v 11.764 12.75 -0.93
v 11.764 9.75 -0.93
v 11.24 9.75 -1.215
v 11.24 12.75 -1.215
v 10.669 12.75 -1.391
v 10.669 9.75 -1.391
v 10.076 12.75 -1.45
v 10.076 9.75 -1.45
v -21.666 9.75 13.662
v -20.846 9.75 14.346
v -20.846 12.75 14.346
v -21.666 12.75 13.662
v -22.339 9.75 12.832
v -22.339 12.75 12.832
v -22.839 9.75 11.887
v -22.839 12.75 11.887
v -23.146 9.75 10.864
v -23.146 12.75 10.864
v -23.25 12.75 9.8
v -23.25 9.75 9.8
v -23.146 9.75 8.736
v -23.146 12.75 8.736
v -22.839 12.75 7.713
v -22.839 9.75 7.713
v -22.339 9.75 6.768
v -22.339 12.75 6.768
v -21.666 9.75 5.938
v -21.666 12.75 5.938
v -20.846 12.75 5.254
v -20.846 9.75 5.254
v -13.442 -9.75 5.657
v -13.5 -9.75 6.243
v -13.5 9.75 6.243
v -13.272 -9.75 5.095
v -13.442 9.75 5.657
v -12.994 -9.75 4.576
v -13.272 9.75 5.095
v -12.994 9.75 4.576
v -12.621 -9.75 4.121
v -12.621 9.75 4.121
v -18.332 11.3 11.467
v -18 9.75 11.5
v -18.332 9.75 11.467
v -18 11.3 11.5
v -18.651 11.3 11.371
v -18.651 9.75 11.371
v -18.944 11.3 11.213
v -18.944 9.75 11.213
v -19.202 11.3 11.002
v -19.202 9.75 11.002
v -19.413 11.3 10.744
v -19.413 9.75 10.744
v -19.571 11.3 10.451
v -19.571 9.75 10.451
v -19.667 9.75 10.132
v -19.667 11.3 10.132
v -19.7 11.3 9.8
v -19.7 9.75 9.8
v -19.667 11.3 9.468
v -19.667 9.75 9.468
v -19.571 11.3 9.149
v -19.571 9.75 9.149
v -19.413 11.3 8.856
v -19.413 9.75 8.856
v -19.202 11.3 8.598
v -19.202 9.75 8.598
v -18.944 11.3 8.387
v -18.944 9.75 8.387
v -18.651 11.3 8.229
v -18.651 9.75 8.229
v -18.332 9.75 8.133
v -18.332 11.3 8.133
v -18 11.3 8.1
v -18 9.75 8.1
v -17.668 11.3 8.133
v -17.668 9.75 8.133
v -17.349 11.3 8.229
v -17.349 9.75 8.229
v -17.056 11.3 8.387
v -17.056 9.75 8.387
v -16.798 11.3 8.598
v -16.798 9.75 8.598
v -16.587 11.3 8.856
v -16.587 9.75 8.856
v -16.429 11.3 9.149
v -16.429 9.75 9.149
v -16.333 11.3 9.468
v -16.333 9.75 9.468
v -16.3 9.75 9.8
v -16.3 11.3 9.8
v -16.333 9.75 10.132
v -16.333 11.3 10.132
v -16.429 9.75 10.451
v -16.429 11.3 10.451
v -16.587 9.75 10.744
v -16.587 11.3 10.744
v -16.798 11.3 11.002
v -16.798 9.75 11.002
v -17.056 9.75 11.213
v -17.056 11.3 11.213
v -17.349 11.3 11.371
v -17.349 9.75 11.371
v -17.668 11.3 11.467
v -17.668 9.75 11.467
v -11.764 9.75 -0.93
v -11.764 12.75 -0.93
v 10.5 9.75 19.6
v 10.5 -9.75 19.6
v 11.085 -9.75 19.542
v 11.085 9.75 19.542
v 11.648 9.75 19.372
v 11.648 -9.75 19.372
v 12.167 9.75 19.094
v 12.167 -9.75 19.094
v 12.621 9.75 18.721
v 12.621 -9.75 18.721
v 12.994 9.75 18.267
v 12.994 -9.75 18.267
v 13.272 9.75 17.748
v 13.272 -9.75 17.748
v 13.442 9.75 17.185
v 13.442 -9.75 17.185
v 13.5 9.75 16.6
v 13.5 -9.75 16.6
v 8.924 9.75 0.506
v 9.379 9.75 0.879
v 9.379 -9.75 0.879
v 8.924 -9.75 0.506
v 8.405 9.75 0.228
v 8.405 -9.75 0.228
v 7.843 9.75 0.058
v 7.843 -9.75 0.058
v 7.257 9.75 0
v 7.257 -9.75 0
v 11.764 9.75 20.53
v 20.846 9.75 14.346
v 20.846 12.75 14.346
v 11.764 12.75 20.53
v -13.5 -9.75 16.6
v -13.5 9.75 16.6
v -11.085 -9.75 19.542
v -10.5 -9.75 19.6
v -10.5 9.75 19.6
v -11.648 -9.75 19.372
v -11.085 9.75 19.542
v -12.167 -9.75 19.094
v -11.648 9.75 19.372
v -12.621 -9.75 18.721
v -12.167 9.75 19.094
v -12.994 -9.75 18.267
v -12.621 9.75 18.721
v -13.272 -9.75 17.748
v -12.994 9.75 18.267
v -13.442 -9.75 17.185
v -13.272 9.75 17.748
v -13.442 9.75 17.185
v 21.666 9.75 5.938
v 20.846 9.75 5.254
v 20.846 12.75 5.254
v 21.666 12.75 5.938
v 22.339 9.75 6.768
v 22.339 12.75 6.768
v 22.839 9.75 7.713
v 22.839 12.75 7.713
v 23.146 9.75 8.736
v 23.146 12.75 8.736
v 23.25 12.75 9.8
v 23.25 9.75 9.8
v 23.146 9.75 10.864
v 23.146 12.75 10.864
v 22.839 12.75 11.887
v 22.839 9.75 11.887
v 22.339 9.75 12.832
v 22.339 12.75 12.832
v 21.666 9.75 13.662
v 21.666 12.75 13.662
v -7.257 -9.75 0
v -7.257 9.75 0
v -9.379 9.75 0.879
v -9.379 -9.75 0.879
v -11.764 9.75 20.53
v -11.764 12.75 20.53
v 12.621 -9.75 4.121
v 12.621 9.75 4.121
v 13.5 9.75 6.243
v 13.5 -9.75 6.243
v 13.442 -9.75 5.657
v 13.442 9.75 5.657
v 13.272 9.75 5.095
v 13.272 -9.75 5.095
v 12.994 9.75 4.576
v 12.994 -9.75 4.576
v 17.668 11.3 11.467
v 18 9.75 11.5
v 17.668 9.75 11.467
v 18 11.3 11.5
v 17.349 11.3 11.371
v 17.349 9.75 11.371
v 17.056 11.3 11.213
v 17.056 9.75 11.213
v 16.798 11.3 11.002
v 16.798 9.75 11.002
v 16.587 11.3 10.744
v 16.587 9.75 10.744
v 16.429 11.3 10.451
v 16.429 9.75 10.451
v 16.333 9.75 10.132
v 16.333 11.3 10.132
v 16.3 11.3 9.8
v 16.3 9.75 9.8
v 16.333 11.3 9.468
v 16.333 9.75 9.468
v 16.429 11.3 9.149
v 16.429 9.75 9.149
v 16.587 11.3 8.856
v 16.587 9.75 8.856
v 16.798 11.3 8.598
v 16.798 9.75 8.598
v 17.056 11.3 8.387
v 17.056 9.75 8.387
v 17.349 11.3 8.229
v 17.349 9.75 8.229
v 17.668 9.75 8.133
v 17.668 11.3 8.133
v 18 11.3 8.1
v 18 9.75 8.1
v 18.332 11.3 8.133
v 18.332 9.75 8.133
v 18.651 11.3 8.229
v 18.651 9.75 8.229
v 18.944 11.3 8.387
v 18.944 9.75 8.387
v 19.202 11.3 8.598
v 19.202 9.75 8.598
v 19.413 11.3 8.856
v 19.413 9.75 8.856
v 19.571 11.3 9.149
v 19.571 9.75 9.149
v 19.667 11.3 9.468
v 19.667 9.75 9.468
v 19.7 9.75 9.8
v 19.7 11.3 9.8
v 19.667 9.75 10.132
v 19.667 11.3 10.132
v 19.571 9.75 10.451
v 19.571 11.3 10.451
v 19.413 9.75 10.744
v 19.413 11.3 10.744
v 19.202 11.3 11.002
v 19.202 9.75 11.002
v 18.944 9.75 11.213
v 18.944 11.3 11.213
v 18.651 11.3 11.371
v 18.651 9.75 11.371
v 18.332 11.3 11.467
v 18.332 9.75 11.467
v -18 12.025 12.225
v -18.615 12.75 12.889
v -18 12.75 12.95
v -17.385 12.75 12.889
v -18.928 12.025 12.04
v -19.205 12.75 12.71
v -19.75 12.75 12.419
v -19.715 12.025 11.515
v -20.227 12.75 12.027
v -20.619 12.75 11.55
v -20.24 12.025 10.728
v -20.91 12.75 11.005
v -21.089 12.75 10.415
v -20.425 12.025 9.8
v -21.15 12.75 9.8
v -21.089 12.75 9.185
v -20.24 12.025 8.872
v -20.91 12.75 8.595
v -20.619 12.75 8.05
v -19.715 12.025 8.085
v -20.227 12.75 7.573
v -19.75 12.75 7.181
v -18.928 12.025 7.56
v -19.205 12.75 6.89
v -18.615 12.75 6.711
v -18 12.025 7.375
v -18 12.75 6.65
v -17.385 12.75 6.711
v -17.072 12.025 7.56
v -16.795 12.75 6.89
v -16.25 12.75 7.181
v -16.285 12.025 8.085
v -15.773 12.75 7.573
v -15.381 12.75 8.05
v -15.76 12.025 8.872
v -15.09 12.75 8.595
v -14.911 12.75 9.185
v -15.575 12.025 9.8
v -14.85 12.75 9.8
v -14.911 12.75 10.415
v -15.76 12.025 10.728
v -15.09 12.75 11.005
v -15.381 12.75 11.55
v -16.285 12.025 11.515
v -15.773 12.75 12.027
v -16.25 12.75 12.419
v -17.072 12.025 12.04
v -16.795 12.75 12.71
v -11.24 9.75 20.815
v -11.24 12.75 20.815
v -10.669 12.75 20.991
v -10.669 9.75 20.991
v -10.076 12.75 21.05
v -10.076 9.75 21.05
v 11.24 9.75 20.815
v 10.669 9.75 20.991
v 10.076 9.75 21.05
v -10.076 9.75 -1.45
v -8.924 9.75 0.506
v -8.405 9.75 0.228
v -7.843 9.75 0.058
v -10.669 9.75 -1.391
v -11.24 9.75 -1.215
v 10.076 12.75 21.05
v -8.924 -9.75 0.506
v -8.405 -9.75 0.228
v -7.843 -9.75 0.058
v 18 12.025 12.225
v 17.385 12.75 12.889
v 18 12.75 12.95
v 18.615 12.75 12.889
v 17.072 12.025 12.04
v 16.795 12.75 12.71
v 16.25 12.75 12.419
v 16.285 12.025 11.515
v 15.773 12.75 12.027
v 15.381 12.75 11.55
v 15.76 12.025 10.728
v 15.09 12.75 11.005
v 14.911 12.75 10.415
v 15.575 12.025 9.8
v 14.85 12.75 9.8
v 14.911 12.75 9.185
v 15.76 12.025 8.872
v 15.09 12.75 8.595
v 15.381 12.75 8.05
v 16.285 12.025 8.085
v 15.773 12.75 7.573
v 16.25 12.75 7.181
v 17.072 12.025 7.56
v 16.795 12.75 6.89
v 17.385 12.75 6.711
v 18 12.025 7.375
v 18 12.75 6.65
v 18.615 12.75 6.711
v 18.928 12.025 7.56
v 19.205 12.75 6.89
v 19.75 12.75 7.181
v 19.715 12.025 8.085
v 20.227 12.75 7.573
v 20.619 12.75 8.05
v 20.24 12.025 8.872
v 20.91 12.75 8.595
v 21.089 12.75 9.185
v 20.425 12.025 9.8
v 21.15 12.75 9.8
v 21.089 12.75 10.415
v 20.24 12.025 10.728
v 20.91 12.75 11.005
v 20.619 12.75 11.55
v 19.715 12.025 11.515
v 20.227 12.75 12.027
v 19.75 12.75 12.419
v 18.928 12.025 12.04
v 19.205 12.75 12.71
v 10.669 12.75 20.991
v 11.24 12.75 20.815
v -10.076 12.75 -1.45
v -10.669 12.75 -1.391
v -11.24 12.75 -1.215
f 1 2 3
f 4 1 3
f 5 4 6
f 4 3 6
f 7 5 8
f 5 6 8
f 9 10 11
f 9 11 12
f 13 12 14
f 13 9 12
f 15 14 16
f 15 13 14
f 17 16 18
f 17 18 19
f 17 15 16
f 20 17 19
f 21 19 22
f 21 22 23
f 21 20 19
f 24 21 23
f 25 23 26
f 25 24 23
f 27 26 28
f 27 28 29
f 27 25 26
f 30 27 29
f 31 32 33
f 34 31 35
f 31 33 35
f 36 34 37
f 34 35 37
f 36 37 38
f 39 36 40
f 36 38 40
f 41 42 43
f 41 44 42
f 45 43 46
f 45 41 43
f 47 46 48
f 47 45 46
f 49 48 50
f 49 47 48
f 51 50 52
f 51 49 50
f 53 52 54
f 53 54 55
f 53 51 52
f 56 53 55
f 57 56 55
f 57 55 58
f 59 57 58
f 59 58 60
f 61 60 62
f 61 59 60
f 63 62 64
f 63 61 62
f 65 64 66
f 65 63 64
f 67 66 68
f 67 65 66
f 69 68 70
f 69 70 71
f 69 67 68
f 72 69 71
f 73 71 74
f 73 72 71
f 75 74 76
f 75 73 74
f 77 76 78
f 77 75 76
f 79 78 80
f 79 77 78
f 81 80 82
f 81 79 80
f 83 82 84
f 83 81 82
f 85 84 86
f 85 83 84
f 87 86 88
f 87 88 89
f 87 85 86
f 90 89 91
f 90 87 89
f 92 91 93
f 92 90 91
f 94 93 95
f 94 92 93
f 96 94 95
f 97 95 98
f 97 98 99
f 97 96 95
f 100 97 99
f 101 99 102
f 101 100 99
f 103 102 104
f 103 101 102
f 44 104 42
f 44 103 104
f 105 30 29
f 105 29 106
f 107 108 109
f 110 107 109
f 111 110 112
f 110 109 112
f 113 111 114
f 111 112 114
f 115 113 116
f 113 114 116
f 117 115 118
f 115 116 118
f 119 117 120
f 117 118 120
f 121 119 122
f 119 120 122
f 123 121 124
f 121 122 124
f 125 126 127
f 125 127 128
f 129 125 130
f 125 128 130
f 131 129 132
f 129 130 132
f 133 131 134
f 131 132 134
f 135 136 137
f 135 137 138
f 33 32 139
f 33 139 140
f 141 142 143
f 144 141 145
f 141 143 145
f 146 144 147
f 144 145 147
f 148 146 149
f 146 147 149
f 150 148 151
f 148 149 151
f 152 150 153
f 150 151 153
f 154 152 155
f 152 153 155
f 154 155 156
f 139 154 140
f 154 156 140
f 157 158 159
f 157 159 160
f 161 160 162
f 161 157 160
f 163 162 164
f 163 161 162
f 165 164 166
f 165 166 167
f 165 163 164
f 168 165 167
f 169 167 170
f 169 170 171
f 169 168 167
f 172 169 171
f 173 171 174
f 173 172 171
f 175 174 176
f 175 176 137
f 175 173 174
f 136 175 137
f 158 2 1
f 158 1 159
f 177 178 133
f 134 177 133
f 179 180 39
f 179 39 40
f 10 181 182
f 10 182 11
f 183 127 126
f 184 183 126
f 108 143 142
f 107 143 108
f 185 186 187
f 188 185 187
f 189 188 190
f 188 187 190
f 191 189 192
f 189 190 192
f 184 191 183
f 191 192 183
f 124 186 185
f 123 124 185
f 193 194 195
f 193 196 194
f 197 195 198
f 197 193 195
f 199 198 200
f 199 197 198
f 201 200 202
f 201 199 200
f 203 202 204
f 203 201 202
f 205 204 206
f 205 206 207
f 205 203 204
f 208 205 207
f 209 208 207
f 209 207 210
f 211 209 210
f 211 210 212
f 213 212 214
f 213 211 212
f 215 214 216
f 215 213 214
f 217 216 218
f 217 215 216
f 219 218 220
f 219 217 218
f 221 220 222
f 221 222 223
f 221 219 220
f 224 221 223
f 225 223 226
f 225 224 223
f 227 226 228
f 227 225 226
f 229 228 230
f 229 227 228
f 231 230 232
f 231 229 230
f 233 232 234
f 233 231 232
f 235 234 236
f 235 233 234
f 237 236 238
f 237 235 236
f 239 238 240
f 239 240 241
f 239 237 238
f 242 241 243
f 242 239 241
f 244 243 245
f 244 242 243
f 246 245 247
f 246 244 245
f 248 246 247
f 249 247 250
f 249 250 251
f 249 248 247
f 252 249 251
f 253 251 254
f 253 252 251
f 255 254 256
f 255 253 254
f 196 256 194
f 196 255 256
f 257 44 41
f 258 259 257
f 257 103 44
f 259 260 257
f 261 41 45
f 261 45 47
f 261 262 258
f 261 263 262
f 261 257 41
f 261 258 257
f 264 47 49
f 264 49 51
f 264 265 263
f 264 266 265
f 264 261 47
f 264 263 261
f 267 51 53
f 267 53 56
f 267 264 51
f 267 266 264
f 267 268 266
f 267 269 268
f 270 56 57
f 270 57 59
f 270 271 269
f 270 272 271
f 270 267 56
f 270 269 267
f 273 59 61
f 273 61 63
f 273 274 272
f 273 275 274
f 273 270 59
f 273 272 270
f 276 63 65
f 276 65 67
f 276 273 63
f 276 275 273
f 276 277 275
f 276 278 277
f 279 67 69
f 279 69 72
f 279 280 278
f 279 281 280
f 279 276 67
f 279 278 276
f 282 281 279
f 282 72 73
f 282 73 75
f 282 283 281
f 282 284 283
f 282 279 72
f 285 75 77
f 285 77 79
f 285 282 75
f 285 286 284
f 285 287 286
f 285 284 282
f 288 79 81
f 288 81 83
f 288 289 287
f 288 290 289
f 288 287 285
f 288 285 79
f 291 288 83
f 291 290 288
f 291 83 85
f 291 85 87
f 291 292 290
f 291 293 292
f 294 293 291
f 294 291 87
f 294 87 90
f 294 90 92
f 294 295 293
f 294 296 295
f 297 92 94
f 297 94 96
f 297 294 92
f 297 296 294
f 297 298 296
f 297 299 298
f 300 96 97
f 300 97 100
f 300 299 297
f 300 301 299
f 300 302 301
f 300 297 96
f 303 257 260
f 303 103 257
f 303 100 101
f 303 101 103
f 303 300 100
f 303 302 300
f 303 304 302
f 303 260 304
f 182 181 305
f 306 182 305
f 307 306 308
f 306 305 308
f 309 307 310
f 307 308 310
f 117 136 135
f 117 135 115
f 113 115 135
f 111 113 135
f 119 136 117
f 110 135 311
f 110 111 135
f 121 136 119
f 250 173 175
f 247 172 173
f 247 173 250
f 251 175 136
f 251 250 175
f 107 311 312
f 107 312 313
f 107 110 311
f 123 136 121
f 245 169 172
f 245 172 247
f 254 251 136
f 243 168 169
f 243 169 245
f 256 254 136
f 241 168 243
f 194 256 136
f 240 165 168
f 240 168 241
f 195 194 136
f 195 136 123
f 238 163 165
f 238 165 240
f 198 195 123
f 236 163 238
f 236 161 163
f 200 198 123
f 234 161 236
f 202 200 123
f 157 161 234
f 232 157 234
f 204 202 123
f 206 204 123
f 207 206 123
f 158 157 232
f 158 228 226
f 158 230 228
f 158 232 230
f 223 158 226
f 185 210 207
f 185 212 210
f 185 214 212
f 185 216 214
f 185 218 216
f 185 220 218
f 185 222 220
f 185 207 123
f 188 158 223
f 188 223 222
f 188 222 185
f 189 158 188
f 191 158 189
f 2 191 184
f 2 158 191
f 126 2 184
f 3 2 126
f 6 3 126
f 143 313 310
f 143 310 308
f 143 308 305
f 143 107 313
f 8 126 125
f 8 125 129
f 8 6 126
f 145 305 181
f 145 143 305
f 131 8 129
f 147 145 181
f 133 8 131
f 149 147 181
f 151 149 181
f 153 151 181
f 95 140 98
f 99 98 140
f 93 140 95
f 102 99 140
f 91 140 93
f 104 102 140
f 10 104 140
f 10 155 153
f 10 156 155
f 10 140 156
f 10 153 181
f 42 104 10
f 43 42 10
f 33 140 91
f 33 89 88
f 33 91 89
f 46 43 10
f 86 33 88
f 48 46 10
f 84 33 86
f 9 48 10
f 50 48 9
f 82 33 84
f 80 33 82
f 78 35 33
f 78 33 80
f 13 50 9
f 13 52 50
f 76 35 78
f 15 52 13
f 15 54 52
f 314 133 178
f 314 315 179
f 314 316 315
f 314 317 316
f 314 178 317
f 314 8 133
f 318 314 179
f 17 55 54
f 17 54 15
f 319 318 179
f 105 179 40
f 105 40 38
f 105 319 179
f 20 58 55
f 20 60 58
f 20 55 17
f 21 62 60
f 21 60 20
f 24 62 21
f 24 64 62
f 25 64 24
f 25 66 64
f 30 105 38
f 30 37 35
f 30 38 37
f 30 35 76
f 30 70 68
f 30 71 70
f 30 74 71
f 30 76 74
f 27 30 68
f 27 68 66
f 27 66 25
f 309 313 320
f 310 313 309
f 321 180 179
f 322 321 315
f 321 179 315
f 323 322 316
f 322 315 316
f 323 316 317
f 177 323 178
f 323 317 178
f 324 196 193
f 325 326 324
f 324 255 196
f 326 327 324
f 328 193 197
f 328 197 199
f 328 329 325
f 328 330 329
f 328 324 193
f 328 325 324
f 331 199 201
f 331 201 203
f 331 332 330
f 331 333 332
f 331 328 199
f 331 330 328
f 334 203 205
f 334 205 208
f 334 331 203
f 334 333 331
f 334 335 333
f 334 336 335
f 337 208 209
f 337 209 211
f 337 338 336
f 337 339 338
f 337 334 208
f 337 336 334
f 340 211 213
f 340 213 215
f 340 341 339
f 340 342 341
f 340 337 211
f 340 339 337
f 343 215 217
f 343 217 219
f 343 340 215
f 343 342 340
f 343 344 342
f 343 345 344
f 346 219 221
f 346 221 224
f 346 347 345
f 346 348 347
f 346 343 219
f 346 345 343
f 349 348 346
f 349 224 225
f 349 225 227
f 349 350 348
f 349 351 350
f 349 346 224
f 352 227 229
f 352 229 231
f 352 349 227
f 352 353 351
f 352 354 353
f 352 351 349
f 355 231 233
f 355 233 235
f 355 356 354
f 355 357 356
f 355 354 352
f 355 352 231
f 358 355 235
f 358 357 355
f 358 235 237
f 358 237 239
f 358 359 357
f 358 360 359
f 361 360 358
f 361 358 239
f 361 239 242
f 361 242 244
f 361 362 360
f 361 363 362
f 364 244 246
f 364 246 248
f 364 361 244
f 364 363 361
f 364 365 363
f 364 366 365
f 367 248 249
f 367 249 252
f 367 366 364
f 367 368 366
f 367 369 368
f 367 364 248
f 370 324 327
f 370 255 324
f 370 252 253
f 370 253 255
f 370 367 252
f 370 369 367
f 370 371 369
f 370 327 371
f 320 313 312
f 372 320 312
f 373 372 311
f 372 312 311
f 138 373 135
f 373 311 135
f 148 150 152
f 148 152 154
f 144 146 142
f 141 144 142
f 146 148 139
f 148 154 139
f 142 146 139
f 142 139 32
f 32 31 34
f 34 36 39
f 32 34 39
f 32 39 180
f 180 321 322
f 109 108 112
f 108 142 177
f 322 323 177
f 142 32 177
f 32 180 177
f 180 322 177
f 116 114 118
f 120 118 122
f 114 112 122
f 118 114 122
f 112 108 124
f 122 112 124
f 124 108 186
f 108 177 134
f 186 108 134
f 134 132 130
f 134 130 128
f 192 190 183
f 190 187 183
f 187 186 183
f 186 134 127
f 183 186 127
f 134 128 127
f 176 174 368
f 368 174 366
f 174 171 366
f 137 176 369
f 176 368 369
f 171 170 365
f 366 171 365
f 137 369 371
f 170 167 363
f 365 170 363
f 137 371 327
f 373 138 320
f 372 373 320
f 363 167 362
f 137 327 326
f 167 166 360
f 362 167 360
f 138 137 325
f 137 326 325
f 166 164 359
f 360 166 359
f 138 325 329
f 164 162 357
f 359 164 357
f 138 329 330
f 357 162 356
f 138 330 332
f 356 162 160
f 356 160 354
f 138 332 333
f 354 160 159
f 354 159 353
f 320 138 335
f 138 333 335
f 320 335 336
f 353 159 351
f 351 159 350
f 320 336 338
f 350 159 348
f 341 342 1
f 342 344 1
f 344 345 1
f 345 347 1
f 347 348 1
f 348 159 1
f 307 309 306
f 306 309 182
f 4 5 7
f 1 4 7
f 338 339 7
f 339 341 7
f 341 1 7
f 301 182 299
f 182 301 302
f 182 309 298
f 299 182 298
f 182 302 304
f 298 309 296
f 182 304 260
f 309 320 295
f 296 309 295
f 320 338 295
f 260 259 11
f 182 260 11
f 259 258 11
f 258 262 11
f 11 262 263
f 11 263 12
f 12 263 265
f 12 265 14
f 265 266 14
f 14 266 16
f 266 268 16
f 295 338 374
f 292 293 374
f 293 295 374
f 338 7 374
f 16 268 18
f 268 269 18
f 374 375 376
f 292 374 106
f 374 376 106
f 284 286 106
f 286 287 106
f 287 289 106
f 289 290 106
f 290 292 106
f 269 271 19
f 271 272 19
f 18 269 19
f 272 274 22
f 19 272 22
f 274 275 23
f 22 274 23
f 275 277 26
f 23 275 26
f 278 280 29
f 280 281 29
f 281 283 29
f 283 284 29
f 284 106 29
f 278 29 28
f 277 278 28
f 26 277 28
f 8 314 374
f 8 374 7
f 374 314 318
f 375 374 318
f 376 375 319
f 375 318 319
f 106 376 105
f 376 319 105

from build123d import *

# Parameters (mm, degrees)
SKIZZE1_W                                    = 27
SKIZZE1_H                                    = 19.5
AUFSATZ_LINEAR_AUSTRAGEN1_DEPTH              = 19.6
FASE1_SIZE                                   = 5
AUFSATZ_LINEAR_AUSTRAGEN2_DEPTH              = 3
VERRUNDUNG1_R                                = 3
FORMSENKUNG_F_R_M3_LINSENSENKSCHRAUB_2_COUNT = 2
FORMSENKUNG_F_R_M3_LINSENSENKSCHRAUB_2_PITCH = 36


with BuildPart() as part:
    # Skizze1 → Aufsatz-Linear austragen1 (new body)
    with BuildSketch(Plane.XY):
        Rectangle(SKIZZE1_W, SKIZZE1_H)
    extrude(amount=AUFSATZ_LINEAR_AUSTRAGEN1_DEPTH)

    # Fase1
    fase1_edges = [part.edges().sort_by_distance(p)[0] for p in [
        (-13.5, 0, 0),
        (13.5, 0, 0),
    ]]
    chamfer(fase1_edges, length=FASE1_SIZE)

    # Skizze2 → Aufsatz-Linear austragen2 (add)
    with BuildSketch(Plane(origin=(0, 9.75, 0), x_dir=(1, 0, 0), z_dir=(0, 1, 0))):
        with BuildLine():
            Line((-11, 1.45), (11, 1.45))
            Line((11, 1.45), (20.845503979, -5.253808724))
            ThreePointArc((20.845503979, -5.253808724), (23.25, -9.8), (20.845503979, -14.346191276))
            Line((20.845503979, -14.346191276), (11, -21.05))
            Line((11, -21.05), (-11, -21.05))
            Line((-11, -21.05), (-20.845503979, -14.346191276))
            ThreePointArc((-20.845503979, -14.346191276), (-23.25, -9.8), (-20.845503979, -5.253808724))
            Line((-20.845503979, -5.253808724), (-11, 1.45))
        make_face()
    extrude(amount=AUFSATZ_LINEAR_AUSTRAGEN2_DEPTH)

    # Verrundung1
    # the kernel refuses this fillet: 3 mm, written as the material it takes off along each edge
    with BuildSketch(Plane(origin=(-13.5, 9.75, 19.6), x_dir=(0, 0, -1), z_dir=(0, -1, 0))) as verrundung1_piece_1:
        with BuildLine():
            CenterArc((VERRUNDUNG1_R, VERRUNDUNG1_R), VERRUNDUNG1_R, 180, 90)
            Line((0, VERRUNDUNG1_R), (0, 0))
            Line((0, 0), (VERRUNDUNG1_R, 0))
        make_face()
    extrude(amount=27, mode=Mode.SUBTRACT)
    with BuildSketch(Plane(origin=(13.5, -12.856601718, 5), x_dir=(0, 0, 1), z_dir=(0, 1, 0)), Plane(origin=(-8.5, 9.75, 0), x_dir=(-0.7071067811865469, 0, 0.707106781186548), z_dir=(0, -1, 0)), Plane(origin=(-13.5, 9.75, 5), x_dir=(0, 0, 1), z_dir=(0, -1, 0))) as verrundung1_piece_2:
        with BuildLine():
            CenterArc((VERRUNDUNG1_R * 0.414213562373, -VERRUNDUNG1_R), VERRUNDUNG1_R, 90, 45)
            Line((-VERRUNDUNG1_R * 0.292893218813, -VERRUNDUNG1_R * 0.292893218813), (0, 0))
            Line((0, 0), (VERRUNDUNG1_R * 0.414213562373, 0))
        make_face()
    extrude(amount=22.606601718, mode=Mode.SUBTRACT)
    with BuildSketch(Plane(origin=(8.5, -12.856601718, 0), x_dir=(-1, 0, 0), z_dir=(0, 1, 0))) as verrundung1_piece_3:
        with BuildLine():
            CenterArc((VERRUNDUNG1_R * 0.414213562373, VERRUNDUNG1_R), VERRUNDUNG1_R, 225, 45)
            Line((-VERRUNDUNG1_R * 0.292893218813, VERRUNDUNG1_R * 0.292893218813), (0, 0))
            Line((0, 0), (VERRUNDUNG1_R * 0.414213562373, 0))
        make_face()
    extrude(amount=22.606601718, mode=Mode.SUBTRACT)
    with BuildSketch(Plane(origin=(11, 7.439046605, -1.45), x_dir=(0.8265802320093436, 0, 0.5628189052007578), z_dir=(0, 1, 0)), Plane(origin=(-11, 7.439046605, -1.45), x_dir=(1, 0, 0), z_dir=(0, 1, 0)), Plane(origin=(-11, 7.439046605, 21.05), x_dir=(-0.8265802320093435, 0, -0.5628189052007582), z_dir=(0, 1, 0))) as verrundung1_piece_4:
        with BuildLine():
            CenterArc((VERRUNDUNG1_R * 0.308127119377, -VERRUNDUNG1_R), VERRUNDUNG1_R, 90, 34.250968868)
            Line((-VERRUNDUNG1_R * 0.254691785823, -VERRUNDUNG1_R * 0.173419767991), (0, 0))
            Line((0, 0), (VERRUNDUNG1_R * 0.308127119377, 0))
        make_face()
    extrude(amount=7.621906791, mode=Mode.SUBTRACT)
    with BuildSketch(Plane(origin=(11, 7.439046605, 21.05), x_dir=(0.8265802320093447, 0, -0.5628189052007564), z_dir=(0, 1, 0))) as verrundung1_piece_5:
        with BuildLine():
            CenterArc((VERRUNDUNG1_R * 0.308127119377, VERRUNDUNG1_R), VERRUNDUNG1_R, 235.749031132, 34.250968868)
            Line((-VERRUNDUNG1_R * 0.254691785823, VERRUNDUNG1_R * 0.173419767991), (0, 0))
            Line((0, 0), (VERRUNDUNG1_R * 0.308127119377, 0))
        make_face()
    extrude(amount=7.621906791, mode=Mode.SUBTRACT)
    with BuildSketch(Plane(origin=(13.5, -17.25, 19.6), x_dir=(-1, 0, 0), z_dir=(0, 1, 0))) as verrundung1_piece_6:
        with BuildLine():
            CenterArc((VERRUNDUNG1_R, -VERRUNDUNG1_R), VERRUNDUNG1_R, 90, 90)
            Line((0, -VERRUNDUNG1_R), (0, 0))
            Line((0, 0), (VERRUNDUNG1_R, 0))
        make_face()
    extrude(amount=27, mode=Mode.SUBTRACT)

    # Skizze4 → Formsenkung für M3 Linsensenkschraube mit Schlitz1 (revolve, cut)
    with BuildSketch(Plane(origin=(-18, 12.75, 9.8), x_dir=(0, 0, 1), z_dir=(1, 0, 0))):
        Polygon((0, 0), (0, 3), (1.7, 3), (1.7, 1.45), (3.15, 0), align=None)
    formsenkung_f_r_m3_linsensenkschraube_mi = revolve(axis=Axis((-18, 19.1, 9.8), (0, -1, 0)), mode=Mode.SUBTRACT)

    # Formsenkung f_r M3 Linsensenkschraub 2: Formsenkung für M3 Linsensenkschraube mit Schlitz1 ×2
    with Locations(*[(i * FORMSENKUNG_F_R_M3_LINSENSENKSCHRAUB_2_PITCH, 0, 0) for i in range(1, FORMSENKUNG_F_R_M3_LINSENSENKSCHRAUB_2_COUNT)]):
        add(formsenkung_f_r_m3_linsensenkschraube_mi, mode=Mode.SUBTRACT)


solid = part.part
